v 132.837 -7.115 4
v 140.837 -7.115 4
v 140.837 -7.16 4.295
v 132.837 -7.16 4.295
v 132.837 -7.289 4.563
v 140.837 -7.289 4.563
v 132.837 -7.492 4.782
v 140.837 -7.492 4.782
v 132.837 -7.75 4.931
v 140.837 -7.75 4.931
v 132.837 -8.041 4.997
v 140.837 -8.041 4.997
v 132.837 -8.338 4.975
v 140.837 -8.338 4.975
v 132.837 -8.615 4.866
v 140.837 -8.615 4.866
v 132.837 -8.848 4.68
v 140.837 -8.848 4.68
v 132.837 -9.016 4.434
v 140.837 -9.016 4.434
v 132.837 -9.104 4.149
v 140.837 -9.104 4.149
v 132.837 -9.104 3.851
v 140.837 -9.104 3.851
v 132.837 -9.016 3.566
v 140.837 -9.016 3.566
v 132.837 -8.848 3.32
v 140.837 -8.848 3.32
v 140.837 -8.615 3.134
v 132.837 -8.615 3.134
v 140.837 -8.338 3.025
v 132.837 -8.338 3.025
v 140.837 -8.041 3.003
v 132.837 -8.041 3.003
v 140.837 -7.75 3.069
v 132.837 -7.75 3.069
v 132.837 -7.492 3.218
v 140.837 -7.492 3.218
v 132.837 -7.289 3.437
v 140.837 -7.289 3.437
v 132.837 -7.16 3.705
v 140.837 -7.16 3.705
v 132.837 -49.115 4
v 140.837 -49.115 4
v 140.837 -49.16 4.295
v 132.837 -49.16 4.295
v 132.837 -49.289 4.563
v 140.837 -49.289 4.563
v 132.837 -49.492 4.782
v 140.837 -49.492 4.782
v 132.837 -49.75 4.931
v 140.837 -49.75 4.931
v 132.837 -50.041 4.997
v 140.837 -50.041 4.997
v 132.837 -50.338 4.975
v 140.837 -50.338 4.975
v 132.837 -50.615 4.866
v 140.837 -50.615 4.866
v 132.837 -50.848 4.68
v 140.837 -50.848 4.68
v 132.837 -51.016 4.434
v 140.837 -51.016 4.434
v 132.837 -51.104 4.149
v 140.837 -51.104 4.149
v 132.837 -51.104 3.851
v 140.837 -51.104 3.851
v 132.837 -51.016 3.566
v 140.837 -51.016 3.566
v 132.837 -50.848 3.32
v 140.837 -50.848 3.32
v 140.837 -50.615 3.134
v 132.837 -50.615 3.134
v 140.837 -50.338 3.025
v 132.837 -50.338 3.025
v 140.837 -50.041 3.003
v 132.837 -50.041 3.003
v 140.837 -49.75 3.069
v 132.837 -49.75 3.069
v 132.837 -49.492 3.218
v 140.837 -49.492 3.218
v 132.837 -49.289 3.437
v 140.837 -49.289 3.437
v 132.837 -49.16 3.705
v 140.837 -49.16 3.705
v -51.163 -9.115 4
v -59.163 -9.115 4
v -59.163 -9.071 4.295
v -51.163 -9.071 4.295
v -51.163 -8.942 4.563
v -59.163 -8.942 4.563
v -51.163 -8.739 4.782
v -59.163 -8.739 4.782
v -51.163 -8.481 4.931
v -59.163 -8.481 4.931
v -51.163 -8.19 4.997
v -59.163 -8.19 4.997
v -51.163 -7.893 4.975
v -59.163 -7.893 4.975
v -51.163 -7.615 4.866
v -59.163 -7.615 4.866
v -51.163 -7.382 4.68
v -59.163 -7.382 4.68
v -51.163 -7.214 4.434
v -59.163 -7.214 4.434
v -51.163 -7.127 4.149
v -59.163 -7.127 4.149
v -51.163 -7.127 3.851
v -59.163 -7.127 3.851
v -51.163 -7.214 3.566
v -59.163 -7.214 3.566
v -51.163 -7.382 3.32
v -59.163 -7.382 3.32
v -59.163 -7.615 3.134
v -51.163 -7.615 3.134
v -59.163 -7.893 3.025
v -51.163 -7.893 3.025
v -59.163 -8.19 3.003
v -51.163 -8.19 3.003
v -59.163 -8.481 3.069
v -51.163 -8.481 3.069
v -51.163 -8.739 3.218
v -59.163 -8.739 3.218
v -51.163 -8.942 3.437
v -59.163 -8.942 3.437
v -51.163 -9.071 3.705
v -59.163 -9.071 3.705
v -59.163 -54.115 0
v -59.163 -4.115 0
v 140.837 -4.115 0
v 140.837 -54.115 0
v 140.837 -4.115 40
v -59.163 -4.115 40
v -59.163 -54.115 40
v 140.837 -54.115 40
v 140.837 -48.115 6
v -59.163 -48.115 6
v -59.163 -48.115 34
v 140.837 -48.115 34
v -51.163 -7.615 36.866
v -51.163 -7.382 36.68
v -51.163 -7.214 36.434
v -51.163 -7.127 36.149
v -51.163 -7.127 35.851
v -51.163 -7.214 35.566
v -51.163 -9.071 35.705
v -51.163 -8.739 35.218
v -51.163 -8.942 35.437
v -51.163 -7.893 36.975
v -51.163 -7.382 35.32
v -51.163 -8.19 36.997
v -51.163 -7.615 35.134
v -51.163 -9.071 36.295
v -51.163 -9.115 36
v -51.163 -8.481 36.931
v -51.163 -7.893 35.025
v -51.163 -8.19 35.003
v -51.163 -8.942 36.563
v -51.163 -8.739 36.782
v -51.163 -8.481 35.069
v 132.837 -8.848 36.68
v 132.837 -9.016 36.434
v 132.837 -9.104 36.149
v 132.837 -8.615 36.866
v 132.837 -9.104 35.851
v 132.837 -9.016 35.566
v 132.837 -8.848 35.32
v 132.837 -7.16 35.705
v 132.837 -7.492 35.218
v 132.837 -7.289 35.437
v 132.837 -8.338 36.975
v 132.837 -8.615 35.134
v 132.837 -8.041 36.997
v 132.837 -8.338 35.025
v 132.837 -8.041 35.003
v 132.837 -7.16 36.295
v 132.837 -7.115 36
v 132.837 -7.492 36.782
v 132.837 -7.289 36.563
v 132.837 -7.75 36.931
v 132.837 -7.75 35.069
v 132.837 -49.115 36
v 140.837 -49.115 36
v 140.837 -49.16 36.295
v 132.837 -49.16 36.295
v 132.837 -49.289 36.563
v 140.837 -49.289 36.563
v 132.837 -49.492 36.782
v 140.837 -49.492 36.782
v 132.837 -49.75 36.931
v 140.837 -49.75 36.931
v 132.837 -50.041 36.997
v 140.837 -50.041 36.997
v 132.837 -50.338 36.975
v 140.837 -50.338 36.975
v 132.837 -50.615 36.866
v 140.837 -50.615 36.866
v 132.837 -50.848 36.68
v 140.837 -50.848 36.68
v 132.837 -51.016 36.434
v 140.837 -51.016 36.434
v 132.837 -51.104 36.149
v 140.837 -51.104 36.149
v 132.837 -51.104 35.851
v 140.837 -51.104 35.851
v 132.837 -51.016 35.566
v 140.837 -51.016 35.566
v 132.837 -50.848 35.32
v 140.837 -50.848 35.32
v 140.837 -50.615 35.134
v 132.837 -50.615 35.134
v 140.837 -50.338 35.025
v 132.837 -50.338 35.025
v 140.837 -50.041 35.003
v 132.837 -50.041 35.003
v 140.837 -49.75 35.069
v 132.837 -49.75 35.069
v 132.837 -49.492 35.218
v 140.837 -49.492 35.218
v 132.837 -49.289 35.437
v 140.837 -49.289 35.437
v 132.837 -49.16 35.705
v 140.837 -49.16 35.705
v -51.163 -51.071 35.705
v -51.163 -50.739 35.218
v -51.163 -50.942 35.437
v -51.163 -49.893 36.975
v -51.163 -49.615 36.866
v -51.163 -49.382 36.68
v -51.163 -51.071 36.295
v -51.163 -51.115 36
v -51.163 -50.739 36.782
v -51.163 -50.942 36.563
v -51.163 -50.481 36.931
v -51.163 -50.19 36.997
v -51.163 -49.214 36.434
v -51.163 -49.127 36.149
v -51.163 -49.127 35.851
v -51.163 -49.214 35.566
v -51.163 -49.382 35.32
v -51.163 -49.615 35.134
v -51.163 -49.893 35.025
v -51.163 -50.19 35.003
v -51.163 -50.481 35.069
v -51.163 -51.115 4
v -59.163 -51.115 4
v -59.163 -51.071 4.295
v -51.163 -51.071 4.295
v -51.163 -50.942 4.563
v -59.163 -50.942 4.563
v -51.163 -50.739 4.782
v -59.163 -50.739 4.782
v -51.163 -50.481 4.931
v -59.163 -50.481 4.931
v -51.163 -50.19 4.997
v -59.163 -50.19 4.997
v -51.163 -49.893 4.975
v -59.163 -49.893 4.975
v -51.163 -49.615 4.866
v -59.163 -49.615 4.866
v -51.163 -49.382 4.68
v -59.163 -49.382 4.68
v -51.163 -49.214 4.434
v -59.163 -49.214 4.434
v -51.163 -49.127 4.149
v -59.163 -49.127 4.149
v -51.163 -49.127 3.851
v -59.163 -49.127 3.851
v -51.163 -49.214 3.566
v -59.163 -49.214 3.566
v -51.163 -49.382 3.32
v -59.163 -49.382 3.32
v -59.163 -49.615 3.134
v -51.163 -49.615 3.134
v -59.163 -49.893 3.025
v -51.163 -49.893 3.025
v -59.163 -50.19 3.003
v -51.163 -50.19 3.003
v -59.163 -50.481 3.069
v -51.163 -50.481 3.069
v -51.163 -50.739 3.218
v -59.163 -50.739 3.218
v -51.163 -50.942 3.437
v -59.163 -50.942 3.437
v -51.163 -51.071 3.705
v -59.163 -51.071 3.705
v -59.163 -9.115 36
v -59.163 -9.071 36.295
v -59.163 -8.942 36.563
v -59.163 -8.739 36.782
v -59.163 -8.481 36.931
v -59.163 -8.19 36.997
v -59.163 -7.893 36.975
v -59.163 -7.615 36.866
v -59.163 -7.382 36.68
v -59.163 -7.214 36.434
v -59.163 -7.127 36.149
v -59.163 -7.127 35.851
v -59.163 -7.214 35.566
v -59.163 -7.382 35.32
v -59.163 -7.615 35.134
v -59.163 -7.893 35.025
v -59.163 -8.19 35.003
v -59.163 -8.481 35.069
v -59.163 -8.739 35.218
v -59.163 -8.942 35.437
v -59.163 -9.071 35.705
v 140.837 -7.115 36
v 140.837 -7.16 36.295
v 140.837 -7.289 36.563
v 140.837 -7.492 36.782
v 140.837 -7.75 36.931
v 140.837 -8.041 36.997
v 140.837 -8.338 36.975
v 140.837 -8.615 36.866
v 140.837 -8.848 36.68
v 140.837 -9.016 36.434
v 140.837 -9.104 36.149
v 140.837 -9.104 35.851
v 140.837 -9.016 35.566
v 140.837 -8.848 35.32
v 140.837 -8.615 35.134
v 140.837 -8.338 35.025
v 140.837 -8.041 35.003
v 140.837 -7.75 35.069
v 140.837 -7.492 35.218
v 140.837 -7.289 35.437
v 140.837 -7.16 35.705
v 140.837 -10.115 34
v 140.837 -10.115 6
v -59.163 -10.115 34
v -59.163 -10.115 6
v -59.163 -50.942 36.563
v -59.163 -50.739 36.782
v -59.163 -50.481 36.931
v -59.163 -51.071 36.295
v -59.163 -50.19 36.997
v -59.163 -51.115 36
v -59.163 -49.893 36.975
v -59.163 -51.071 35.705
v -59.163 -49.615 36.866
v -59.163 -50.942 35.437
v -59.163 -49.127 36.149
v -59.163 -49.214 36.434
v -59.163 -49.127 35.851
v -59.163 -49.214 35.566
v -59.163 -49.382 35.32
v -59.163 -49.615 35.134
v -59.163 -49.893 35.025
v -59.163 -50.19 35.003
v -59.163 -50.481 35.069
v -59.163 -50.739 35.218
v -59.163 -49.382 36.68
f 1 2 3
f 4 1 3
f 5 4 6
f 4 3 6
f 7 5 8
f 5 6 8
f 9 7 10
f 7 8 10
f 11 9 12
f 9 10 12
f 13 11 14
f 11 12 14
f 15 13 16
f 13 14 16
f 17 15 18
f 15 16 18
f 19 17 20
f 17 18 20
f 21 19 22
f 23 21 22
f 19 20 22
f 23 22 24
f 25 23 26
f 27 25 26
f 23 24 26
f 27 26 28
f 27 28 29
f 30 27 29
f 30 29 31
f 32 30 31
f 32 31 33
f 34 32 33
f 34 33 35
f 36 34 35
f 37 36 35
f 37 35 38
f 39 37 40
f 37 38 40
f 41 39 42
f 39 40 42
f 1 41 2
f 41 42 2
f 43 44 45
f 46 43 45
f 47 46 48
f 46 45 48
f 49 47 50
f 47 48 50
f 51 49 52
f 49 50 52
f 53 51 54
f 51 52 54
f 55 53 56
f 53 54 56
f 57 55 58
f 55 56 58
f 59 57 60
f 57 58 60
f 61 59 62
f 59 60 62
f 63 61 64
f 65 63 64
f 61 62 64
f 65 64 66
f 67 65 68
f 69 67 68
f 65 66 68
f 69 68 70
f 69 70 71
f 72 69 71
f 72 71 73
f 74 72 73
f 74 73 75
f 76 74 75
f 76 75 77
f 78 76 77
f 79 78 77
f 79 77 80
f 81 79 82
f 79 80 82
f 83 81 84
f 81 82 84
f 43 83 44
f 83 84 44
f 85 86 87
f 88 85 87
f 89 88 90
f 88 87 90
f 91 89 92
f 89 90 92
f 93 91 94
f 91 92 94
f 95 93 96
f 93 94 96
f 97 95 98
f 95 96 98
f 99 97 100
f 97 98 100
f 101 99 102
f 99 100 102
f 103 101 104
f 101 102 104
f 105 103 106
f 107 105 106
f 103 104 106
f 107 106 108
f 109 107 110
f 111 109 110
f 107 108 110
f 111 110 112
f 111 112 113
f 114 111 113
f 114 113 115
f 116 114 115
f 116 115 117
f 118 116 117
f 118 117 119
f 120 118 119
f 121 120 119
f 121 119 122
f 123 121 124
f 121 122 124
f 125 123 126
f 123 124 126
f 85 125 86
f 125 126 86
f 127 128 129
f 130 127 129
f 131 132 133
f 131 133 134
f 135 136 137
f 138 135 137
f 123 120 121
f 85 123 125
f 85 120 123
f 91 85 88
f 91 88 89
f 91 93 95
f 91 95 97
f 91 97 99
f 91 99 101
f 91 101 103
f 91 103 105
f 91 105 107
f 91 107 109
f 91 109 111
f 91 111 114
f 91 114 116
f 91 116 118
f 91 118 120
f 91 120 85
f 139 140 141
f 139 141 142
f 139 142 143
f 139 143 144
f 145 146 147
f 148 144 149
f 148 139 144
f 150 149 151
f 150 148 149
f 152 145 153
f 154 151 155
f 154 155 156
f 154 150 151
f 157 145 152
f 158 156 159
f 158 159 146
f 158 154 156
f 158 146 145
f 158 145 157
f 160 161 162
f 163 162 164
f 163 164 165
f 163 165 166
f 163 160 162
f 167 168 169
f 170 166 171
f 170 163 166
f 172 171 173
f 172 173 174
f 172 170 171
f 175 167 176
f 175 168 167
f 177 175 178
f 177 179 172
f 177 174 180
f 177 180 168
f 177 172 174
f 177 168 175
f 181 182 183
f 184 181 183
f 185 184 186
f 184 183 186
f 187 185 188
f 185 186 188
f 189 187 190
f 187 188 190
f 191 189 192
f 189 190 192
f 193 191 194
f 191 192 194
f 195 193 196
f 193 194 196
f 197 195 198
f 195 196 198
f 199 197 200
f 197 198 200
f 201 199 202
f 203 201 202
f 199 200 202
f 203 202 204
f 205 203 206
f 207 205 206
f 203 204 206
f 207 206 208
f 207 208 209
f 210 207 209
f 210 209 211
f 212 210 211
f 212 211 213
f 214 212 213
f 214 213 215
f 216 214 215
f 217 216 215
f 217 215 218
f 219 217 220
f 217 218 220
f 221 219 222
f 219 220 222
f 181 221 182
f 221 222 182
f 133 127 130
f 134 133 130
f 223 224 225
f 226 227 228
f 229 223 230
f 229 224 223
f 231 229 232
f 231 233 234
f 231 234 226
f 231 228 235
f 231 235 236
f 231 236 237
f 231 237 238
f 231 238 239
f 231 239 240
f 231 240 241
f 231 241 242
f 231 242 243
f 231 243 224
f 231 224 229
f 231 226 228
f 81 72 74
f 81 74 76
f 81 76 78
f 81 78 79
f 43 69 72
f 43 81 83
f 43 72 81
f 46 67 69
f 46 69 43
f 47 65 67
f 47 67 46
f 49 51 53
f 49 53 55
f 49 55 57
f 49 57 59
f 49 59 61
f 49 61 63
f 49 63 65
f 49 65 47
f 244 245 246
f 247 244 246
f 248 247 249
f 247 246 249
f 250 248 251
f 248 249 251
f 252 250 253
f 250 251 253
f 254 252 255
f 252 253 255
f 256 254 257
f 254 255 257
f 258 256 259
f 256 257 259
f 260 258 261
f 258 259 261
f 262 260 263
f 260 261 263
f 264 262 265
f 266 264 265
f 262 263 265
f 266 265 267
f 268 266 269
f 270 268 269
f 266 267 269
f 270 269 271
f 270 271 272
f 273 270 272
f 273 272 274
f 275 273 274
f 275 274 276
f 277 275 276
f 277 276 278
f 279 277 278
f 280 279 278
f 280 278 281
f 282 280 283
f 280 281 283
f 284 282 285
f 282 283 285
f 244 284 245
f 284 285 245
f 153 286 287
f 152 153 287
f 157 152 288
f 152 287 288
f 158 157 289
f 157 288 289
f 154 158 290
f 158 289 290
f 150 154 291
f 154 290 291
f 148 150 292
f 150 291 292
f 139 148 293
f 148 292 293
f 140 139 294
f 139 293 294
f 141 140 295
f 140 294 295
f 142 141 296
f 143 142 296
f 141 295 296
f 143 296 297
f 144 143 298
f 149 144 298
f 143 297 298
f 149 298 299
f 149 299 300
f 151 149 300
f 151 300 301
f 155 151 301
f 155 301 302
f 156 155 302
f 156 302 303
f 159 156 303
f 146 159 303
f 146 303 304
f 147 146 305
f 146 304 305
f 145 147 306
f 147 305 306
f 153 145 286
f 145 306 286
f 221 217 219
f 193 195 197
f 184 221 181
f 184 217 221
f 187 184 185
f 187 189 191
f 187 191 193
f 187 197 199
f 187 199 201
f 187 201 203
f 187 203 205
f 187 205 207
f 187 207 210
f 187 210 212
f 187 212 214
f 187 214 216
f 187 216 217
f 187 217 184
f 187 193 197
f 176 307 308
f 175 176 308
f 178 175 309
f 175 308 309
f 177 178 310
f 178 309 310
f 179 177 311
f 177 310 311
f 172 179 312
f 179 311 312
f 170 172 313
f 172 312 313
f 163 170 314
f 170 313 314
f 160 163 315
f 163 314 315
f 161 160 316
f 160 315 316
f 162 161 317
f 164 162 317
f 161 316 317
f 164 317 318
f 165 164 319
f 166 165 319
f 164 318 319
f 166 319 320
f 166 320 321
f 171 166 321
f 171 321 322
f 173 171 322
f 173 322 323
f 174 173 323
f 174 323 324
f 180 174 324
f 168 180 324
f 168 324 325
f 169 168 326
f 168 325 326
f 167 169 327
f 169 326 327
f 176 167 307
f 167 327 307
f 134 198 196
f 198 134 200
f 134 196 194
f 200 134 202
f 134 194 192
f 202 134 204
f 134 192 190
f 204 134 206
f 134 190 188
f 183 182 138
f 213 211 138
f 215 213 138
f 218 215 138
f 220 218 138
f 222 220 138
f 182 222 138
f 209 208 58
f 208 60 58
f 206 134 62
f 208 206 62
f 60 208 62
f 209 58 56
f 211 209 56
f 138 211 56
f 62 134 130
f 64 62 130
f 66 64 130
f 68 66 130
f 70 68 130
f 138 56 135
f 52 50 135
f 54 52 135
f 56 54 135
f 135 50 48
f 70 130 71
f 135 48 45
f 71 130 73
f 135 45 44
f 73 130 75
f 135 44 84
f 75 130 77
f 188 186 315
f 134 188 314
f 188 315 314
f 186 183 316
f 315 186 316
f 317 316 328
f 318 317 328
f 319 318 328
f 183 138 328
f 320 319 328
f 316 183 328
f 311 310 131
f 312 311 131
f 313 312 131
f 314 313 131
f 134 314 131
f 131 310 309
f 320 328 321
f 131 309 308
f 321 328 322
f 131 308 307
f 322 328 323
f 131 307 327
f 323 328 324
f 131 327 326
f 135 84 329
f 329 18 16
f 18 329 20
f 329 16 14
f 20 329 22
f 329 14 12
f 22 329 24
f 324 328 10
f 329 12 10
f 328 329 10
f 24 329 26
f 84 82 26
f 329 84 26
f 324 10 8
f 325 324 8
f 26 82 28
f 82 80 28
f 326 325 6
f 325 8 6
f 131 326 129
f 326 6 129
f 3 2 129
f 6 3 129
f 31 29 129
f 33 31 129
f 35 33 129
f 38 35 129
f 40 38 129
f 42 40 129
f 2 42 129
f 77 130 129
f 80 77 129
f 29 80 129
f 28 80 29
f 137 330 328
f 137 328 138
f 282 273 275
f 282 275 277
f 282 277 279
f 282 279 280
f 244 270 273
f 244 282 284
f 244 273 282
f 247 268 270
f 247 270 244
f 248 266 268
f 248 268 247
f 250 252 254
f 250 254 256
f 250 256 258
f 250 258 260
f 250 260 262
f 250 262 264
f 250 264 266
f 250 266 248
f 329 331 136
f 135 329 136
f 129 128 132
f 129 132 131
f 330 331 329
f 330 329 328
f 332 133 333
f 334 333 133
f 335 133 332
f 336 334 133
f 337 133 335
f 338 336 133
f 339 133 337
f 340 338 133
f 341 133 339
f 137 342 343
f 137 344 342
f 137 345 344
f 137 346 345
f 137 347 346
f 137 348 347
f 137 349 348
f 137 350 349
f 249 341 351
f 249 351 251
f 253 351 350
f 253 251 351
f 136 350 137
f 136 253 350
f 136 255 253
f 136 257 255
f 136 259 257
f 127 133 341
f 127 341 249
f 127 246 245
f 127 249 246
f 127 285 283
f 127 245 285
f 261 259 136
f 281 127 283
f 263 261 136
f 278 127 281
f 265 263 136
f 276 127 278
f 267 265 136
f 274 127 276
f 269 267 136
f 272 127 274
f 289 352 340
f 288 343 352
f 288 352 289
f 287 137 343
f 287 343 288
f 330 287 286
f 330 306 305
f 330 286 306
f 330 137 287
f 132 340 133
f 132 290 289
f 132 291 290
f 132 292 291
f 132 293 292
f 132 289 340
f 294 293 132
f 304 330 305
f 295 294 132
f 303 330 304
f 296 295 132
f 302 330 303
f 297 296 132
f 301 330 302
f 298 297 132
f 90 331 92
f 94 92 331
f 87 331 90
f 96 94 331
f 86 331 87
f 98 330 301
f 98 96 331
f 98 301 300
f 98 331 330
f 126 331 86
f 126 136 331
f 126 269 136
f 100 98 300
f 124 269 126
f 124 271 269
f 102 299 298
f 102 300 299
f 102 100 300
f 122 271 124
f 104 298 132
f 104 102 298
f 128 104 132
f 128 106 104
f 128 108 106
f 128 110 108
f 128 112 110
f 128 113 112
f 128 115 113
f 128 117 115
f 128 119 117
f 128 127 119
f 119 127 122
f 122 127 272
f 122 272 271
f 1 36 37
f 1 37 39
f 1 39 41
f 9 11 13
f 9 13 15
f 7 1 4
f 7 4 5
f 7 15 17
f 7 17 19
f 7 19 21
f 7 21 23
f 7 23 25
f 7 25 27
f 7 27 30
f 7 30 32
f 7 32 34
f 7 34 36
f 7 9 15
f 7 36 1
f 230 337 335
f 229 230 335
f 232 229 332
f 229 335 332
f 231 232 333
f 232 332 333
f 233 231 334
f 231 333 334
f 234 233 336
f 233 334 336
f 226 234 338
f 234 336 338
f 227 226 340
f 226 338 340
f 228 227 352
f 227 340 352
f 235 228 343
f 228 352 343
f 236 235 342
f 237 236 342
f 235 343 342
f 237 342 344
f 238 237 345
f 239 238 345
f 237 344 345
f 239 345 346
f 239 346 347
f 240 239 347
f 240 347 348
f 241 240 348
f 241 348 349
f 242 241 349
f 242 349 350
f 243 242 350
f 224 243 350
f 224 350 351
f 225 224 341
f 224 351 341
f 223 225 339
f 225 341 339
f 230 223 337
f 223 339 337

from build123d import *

# Parameters (mm, degrees)
F0_W     = 200
F0_H     = 50
F1_DEPTH = 40
F2_W     = 38
F2_H     = 28
F3_DEPTH = 200.001
F4_R     = 1
F5_DEPTH = 8
F6_R     = 1
F7_DEPTH = 8


with BuildPart() as f1:
    # F0 (on Top) → F1 (new body)
    with BuildSketch(Plane.XY):
        with Locations((40.836534, -29.115389)):
            Rectangle(F0_W, F0_H)
    extrude(amount=F1_DEPTH)

    # F2 (on face) → F3 (cut, through all)
    with BuildSketch(Plane(origin=(-59.163466, 0, 0), x_dir=(0, -1, 0), z_dir=(-1, 0, 0))):
        with Locations((29.115389, 20)):
            Rectangle(F2_W, F2_H)
    extrude(amount=-F3_DEPTH, mode=Mode.SUBTRACT)

    # F4 (on face) → F5 (cut)
    with BuildSketch(Plane(origin=(-59.163466, 0, 0), x_dir=(0, -1, 0), z_dir=(-1, 0, 0))):
        with Locations((8.115389, 36)):
            Circle(F4_R)
        with Locations((8.115389, 4)):
            Circle(F4_R)
        with Locations((50.115389, 4)):
            Circle(F4_R)
        with Locations((50.115389, 36)):
            Circle(F4_R)
    extrude(amount=-F5_DEPTH, mode=Mode.SUBTRACT)

    # F6 (on face) → F7 (cut)
    with BuildSketch(Plane.YZ.offset(140.836534)):
        with Locations((-50.115389, 36)):
            Circle(F6_R)
        with Locations((-8.115389, 36)):
            Circle(F6_R)
        with Locations((-8.115389, 4)):
            Circle(F6_R)
        with Locations((-50.115389, 4)):
            Circle(F6_R)
    extrude(amount=-F7_DEPTH, mode=Mode.SUBTRACT)


solid = f1.part
